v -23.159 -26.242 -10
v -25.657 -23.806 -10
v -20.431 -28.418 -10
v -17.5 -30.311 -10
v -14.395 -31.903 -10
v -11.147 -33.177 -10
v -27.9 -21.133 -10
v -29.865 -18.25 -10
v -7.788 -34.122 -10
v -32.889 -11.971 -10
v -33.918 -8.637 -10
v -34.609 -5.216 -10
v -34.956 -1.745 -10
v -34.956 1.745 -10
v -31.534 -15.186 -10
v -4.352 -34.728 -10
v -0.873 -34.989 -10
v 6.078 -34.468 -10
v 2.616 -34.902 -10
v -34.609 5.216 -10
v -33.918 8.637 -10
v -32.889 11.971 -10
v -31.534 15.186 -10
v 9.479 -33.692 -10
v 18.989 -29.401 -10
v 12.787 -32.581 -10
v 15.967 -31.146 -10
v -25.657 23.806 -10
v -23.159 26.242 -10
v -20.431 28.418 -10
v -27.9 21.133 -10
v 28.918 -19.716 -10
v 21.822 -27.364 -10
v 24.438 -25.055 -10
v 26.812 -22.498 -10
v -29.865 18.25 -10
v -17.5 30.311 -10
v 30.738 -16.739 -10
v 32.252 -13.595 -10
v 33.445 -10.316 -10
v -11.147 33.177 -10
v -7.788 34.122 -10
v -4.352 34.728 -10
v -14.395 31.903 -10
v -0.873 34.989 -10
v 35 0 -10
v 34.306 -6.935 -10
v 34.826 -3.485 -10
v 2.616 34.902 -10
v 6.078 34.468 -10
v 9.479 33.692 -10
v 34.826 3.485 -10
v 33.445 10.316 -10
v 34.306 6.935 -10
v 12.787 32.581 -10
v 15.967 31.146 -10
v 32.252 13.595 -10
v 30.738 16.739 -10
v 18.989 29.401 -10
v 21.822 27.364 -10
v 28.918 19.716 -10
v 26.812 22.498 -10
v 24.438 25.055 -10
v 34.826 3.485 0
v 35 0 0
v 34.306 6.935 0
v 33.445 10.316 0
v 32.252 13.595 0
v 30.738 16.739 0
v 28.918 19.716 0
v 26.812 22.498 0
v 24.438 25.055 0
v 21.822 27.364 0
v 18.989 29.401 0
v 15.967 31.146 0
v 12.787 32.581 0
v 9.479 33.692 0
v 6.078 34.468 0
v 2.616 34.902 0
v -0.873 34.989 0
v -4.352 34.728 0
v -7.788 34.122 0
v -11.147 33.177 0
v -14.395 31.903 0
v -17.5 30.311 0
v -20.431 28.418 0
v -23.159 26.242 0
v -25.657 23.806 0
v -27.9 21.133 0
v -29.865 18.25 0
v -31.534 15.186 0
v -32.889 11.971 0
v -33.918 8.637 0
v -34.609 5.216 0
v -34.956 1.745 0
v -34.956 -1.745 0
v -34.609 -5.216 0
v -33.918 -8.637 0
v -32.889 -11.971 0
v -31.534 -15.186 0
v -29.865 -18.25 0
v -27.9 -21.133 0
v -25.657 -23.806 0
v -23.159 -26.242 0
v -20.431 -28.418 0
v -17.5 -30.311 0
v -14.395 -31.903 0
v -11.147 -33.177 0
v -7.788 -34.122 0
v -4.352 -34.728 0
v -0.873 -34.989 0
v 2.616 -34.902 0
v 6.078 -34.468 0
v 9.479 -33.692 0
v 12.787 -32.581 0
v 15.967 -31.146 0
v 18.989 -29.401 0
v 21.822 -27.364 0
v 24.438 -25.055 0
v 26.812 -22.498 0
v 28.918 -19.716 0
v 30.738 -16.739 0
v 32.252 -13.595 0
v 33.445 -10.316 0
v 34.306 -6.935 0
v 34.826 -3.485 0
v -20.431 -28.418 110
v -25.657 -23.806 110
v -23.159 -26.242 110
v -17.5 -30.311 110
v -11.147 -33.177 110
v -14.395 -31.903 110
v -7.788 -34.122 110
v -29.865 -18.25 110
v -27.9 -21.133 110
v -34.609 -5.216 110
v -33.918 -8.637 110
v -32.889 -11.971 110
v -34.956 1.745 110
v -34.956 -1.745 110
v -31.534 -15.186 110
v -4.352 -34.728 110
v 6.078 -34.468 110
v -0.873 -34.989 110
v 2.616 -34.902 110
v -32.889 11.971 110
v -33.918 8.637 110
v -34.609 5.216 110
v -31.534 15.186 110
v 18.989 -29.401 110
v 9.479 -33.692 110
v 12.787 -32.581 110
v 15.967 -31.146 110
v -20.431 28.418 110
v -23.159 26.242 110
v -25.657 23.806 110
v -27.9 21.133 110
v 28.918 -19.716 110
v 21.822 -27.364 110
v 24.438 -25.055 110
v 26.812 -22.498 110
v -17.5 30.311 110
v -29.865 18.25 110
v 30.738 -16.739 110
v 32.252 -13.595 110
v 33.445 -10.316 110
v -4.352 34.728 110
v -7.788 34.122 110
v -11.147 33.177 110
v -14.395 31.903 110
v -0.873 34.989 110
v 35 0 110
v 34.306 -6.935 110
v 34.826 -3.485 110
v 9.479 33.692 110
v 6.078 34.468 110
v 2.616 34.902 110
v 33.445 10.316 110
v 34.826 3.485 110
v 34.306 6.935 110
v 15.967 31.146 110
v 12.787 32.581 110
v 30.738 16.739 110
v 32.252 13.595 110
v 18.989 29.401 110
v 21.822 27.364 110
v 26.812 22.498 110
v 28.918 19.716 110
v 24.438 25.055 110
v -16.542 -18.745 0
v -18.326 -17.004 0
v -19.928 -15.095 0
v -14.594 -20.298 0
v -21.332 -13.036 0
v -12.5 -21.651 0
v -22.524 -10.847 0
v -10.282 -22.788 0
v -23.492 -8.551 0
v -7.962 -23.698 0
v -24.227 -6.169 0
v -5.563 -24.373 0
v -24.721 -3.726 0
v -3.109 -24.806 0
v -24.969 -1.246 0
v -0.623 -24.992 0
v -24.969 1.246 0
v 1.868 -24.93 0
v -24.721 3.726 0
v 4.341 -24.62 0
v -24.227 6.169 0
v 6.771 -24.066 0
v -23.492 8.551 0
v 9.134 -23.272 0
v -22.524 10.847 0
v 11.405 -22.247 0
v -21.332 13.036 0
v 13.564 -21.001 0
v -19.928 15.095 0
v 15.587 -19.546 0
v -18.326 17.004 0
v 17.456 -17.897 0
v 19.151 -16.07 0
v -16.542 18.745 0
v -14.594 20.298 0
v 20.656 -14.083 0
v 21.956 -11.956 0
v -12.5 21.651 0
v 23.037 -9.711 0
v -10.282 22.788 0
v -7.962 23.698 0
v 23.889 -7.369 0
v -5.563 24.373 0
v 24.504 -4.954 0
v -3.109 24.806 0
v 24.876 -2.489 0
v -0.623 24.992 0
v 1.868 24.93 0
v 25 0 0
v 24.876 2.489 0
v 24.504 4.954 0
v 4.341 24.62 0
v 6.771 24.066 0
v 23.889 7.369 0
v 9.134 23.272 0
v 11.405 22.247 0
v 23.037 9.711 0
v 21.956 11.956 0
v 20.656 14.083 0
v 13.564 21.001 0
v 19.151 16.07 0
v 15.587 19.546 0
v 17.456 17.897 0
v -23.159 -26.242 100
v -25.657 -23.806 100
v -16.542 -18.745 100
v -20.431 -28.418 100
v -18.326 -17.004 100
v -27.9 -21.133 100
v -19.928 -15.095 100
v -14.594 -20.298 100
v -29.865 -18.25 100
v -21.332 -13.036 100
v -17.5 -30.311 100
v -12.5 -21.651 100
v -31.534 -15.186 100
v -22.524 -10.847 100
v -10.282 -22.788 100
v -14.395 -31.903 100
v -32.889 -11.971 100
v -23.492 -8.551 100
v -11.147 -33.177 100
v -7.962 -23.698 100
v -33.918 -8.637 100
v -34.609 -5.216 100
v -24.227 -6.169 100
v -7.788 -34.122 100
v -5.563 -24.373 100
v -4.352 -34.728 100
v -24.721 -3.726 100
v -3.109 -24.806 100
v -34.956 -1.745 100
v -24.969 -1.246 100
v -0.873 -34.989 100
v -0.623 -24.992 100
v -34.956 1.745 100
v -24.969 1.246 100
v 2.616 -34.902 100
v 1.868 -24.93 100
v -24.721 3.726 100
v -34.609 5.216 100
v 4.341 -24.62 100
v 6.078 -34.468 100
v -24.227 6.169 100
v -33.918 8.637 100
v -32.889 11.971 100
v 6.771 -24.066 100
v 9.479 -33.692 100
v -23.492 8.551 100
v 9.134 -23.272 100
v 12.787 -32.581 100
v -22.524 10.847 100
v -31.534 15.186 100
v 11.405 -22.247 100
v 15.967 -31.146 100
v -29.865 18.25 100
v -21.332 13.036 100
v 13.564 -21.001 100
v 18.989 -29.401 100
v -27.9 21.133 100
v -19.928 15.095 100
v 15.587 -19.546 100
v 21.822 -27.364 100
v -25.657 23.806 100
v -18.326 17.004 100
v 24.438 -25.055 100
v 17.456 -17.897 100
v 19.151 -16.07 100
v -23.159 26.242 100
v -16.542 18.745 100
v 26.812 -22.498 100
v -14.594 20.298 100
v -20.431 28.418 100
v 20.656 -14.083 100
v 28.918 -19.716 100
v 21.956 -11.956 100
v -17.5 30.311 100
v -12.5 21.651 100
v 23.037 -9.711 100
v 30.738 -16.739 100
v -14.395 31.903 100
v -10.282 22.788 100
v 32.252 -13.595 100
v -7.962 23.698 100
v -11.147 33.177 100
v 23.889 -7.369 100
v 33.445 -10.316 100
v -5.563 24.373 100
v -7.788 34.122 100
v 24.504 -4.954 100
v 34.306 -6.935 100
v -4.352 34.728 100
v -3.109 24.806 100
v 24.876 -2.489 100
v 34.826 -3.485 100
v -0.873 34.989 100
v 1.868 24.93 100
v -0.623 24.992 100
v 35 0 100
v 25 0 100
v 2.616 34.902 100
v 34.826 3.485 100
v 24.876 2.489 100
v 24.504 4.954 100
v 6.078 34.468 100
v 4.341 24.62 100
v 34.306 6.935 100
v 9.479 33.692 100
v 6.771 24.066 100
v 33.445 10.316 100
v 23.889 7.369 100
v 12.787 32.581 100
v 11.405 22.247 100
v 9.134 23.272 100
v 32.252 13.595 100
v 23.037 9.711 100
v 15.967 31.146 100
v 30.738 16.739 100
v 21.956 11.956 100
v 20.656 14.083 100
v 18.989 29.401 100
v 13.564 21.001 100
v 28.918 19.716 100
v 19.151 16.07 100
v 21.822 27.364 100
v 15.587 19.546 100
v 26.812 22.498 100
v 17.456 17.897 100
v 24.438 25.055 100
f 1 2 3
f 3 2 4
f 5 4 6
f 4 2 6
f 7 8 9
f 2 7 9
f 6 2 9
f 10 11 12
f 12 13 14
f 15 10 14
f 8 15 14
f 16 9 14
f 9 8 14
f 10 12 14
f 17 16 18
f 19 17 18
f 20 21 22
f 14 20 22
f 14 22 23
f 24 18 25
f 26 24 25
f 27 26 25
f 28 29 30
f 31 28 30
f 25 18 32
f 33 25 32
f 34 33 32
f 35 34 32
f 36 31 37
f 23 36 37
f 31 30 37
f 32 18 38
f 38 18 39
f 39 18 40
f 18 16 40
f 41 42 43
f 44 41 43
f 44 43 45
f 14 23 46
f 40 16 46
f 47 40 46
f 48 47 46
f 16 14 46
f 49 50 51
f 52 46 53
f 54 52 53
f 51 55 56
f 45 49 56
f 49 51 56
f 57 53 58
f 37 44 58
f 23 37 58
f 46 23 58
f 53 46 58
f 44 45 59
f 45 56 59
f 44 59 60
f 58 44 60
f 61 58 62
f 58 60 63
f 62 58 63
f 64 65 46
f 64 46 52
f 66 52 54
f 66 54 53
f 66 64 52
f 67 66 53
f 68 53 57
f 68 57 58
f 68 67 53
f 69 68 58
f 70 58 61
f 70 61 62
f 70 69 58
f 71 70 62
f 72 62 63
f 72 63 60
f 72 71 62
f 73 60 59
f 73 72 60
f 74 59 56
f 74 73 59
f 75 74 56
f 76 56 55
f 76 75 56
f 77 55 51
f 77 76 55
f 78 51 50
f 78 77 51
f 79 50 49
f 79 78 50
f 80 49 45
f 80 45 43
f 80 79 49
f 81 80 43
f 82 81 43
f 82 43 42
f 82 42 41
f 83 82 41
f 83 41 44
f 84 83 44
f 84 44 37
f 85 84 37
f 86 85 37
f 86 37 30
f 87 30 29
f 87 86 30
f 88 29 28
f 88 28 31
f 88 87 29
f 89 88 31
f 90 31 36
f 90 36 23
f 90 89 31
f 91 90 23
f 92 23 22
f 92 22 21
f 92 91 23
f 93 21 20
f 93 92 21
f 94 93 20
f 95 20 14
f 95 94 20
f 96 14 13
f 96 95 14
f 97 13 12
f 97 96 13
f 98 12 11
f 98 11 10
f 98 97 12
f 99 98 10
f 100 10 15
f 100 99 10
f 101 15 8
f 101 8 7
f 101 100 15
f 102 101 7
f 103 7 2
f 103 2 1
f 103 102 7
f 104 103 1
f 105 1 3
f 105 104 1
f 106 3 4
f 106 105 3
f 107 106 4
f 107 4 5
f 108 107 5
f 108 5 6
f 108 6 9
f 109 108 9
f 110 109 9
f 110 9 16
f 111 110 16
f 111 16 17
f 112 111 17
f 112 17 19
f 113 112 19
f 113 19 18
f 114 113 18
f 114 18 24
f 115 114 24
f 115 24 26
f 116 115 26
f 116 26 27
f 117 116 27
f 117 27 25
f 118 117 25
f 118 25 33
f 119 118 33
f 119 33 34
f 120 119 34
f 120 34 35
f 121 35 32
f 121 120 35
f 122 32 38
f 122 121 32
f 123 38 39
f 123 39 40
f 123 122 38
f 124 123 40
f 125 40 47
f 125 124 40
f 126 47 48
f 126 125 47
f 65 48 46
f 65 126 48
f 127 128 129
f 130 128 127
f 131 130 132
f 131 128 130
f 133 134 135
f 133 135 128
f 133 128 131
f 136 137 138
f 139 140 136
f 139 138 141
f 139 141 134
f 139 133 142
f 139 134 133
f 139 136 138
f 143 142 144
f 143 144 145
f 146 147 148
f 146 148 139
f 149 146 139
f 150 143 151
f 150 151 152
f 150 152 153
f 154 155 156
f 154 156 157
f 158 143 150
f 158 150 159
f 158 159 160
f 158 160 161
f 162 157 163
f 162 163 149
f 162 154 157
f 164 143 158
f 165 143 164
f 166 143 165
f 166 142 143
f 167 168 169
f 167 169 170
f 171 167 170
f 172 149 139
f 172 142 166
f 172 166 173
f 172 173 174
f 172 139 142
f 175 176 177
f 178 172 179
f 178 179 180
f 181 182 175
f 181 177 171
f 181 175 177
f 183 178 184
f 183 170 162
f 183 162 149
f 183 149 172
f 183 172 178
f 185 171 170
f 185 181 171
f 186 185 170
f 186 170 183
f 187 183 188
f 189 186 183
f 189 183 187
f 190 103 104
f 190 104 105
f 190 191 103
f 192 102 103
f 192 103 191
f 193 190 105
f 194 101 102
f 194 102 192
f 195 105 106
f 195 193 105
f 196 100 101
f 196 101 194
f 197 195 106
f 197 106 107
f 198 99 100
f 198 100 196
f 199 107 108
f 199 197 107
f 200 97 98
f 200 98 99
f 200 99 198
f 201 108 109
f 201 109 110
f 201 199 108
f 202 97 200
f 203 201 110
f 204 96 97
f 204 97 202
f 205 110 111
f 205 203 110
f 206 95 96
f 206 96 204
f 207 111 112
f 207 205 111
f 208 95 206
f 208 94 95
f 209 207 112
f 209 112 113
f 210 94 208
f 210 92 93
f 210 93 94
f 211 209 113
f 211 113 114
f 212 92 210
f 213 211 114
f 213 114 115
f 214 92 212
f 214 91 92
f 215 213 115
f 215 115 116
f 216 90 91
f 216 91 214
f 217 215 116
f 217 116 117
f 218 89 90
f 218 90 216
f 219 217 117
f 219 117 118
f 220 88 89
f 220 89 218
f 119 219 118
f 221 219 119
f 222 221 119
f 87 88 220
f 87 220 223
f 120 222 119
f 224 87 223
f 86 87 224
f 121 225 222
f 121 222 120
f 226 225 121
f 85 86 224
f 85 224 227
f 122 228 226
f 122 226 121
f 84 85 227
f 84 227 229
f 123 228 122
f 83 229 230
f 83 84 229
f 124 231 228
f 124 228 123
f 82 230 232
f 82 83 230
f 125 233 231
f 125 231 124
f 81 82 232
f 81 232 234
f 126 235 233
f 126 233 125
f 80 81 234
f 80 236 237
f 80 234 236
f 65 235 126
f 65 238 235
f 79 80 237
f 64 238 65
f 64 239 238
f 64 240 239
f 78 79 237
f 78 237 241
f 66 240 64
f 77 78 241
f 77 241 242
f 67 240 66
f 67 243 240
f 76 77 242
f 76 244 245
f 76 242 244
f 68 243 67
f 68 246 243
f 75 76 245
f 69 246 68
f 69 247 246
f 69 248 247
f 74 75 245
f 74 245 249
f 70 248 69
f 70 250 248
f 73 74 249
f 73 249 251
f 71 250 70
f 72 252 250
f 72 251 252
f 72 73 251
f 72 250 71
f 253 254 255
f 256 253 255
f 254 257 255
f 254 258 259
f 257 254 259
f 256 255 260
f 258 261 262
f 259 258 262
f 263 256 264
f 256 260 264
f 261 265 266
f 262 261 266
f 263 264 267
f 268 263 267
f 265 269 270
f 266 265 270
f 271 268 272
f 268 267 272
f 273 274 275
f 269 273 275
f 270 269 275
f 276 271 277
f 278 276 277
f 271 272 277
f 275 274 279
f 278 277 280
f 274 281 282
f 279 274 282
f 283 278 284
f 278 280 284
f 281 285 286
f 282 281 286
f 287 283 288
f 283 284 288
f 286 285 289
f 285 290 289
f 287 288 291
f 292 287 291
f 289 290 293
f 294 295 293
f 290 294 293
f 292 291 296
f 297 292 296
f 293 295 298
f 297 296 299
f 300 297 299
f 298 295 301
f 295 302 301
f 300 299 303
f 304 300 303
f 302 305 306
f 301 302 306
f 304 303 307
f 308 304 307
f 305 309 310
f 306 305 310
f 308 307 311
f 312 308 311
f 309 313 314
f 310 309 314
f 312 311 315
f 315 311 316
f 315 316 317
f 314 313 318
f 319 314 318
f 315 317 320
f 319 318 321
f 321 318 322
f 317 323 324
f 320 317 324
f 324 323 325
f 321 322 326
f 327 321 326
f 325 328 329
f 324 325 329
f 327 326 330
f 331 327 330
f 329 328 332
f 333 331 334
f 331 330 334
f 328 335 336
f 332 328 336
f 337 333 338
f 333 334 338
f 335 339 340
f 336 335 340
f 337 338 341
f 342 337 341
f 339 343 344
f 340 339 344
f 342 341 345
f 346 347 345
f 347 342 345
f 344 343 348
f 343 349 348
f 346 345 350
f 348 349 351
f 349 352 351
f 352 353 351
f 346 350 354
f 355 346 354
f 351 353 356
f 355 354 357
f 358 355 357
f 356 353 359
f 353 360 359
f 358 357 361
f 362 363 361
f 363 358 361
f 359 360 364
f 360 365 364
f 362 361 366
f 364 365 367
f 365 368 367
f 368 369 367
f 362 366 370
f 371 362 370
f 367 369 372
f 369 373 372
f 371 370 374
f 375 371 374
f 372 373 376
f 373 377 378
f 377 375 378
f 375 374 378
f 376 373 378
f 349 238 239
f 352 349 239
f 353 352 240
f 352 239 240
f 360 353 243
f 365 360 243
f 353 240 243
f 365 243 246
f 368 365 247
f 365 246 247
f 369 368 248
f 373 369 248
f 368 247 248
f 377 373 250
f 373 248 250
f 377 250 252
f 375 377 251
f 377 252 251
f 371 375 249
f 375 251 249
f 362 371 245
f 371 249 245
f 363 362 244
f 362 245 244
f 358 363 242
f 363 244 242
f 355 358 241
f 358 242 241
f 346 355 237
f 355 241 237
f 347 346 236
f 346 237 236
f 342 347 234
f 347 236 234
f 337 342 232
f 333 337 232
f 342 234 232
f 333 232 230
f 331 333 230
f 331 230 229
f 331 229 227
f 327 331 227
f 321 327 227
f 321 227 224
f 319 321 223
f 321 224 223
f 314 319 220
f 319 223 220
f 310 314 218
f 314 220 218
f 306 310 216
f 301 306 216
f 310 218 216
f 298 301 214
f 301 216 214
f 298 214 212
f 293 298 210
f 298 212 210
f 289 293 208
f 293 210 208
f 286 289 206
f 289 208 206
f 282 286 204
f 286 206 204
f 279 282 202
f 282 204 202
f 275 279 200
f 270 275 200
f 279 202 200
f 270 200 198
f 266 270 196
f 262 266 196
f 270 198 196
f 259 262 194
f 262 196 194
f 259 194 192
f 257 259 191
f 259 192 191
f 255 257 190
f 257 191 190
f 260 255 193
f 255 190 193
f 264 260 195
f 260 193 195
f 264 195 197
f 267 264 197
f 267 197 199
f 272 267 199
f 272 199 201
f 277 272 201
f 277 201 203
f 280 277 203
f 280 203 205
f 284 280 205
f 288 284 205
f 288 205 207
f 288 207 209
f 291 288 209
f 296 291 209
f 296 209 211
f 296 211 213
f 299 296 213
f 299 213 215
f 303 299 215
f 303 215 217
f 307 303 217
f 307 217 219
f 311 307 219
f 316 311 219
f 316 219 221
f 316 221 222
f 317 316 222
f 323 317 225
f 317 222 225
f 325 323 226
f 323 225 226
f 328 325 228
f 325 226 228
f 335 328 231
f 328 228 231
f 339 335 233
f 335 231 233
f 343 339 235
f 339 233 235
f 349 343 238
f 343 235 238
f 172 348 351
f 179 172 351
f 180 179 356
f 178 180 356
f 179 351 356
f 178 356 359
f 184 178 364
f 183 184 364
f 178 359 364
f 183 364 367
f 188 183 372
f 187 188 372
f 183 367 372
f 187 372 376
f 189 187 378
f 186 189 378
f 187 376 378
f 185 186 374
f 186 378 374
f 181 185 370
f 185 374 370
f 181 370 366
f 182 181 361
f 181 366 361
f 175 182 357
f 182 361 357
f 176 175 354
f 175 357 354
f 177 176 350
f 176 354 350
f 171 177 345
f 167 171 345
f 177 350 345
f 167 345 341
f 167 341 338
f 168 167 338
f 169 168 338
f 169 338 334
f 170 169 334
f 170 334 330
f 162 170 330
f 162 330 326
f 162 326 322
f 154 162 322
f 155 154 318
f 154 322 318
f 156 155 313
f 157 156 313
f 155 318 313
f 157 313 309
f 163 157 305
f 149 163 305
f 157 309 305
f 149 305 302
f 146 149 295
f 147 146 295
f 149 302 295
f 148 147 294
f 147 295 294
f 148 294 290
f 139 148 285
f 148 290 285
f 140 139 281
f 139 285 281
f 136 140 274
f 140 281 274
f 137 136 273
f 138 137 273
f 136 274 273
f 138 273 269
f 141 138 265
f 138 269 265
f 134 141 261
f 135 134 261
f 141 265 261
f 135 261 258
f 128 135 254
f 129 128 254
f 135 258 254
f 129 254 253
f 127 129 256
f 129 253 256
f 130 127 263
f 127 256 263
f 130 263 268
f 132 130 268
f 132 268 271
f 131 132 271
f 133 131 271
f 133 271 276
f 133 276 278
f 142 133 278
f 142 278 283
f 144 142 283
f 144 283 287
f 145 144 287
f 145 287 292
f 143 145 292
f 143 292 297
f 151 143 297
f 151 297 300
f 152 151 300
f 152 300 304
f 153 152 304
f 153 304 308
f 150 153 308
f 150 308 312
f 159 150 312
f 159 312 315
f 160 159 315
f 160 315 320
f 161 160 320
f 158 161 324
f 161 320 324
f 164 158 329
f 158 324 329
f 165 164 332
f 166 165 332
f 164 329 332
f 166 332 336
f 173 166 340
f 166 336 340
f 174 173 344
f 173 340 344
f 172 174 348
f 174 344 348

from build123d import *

# Parameters (mm, degrees)
SKETCH1_R           = 25
BOSS_EXTRUDE1_DEPTH = 100
SKETCH2_R           = 35
BOSS_EXTRUDE2_DEPTH = 10


with BuildPart() as part:
    # Sketch1 → Boss-Extrude1 (new body)
    with BuildSketch(Plane.XY):
        Circle(SKETCH1_R)
    extrude(amount=BOSS_EXTRUDE1_DEPTH)

    # Sketch2 → Boss-Extrude2 (add)
    with BuildSketch(Plane.XY.offset(100)):
        Circle(SKETCH2_R)
    boss_extrude2 = extrude(amount=BOSS_EXTRUDE2_DEPTH)

    # Mirror1: Boss-Extrude2 across plane
    add(boss_extrude2.mirror(Plane(origin=(0, 0, 50), x_dir=(1, 0, 0), z_dir=(0, 0, -1))))


solid = part.part
